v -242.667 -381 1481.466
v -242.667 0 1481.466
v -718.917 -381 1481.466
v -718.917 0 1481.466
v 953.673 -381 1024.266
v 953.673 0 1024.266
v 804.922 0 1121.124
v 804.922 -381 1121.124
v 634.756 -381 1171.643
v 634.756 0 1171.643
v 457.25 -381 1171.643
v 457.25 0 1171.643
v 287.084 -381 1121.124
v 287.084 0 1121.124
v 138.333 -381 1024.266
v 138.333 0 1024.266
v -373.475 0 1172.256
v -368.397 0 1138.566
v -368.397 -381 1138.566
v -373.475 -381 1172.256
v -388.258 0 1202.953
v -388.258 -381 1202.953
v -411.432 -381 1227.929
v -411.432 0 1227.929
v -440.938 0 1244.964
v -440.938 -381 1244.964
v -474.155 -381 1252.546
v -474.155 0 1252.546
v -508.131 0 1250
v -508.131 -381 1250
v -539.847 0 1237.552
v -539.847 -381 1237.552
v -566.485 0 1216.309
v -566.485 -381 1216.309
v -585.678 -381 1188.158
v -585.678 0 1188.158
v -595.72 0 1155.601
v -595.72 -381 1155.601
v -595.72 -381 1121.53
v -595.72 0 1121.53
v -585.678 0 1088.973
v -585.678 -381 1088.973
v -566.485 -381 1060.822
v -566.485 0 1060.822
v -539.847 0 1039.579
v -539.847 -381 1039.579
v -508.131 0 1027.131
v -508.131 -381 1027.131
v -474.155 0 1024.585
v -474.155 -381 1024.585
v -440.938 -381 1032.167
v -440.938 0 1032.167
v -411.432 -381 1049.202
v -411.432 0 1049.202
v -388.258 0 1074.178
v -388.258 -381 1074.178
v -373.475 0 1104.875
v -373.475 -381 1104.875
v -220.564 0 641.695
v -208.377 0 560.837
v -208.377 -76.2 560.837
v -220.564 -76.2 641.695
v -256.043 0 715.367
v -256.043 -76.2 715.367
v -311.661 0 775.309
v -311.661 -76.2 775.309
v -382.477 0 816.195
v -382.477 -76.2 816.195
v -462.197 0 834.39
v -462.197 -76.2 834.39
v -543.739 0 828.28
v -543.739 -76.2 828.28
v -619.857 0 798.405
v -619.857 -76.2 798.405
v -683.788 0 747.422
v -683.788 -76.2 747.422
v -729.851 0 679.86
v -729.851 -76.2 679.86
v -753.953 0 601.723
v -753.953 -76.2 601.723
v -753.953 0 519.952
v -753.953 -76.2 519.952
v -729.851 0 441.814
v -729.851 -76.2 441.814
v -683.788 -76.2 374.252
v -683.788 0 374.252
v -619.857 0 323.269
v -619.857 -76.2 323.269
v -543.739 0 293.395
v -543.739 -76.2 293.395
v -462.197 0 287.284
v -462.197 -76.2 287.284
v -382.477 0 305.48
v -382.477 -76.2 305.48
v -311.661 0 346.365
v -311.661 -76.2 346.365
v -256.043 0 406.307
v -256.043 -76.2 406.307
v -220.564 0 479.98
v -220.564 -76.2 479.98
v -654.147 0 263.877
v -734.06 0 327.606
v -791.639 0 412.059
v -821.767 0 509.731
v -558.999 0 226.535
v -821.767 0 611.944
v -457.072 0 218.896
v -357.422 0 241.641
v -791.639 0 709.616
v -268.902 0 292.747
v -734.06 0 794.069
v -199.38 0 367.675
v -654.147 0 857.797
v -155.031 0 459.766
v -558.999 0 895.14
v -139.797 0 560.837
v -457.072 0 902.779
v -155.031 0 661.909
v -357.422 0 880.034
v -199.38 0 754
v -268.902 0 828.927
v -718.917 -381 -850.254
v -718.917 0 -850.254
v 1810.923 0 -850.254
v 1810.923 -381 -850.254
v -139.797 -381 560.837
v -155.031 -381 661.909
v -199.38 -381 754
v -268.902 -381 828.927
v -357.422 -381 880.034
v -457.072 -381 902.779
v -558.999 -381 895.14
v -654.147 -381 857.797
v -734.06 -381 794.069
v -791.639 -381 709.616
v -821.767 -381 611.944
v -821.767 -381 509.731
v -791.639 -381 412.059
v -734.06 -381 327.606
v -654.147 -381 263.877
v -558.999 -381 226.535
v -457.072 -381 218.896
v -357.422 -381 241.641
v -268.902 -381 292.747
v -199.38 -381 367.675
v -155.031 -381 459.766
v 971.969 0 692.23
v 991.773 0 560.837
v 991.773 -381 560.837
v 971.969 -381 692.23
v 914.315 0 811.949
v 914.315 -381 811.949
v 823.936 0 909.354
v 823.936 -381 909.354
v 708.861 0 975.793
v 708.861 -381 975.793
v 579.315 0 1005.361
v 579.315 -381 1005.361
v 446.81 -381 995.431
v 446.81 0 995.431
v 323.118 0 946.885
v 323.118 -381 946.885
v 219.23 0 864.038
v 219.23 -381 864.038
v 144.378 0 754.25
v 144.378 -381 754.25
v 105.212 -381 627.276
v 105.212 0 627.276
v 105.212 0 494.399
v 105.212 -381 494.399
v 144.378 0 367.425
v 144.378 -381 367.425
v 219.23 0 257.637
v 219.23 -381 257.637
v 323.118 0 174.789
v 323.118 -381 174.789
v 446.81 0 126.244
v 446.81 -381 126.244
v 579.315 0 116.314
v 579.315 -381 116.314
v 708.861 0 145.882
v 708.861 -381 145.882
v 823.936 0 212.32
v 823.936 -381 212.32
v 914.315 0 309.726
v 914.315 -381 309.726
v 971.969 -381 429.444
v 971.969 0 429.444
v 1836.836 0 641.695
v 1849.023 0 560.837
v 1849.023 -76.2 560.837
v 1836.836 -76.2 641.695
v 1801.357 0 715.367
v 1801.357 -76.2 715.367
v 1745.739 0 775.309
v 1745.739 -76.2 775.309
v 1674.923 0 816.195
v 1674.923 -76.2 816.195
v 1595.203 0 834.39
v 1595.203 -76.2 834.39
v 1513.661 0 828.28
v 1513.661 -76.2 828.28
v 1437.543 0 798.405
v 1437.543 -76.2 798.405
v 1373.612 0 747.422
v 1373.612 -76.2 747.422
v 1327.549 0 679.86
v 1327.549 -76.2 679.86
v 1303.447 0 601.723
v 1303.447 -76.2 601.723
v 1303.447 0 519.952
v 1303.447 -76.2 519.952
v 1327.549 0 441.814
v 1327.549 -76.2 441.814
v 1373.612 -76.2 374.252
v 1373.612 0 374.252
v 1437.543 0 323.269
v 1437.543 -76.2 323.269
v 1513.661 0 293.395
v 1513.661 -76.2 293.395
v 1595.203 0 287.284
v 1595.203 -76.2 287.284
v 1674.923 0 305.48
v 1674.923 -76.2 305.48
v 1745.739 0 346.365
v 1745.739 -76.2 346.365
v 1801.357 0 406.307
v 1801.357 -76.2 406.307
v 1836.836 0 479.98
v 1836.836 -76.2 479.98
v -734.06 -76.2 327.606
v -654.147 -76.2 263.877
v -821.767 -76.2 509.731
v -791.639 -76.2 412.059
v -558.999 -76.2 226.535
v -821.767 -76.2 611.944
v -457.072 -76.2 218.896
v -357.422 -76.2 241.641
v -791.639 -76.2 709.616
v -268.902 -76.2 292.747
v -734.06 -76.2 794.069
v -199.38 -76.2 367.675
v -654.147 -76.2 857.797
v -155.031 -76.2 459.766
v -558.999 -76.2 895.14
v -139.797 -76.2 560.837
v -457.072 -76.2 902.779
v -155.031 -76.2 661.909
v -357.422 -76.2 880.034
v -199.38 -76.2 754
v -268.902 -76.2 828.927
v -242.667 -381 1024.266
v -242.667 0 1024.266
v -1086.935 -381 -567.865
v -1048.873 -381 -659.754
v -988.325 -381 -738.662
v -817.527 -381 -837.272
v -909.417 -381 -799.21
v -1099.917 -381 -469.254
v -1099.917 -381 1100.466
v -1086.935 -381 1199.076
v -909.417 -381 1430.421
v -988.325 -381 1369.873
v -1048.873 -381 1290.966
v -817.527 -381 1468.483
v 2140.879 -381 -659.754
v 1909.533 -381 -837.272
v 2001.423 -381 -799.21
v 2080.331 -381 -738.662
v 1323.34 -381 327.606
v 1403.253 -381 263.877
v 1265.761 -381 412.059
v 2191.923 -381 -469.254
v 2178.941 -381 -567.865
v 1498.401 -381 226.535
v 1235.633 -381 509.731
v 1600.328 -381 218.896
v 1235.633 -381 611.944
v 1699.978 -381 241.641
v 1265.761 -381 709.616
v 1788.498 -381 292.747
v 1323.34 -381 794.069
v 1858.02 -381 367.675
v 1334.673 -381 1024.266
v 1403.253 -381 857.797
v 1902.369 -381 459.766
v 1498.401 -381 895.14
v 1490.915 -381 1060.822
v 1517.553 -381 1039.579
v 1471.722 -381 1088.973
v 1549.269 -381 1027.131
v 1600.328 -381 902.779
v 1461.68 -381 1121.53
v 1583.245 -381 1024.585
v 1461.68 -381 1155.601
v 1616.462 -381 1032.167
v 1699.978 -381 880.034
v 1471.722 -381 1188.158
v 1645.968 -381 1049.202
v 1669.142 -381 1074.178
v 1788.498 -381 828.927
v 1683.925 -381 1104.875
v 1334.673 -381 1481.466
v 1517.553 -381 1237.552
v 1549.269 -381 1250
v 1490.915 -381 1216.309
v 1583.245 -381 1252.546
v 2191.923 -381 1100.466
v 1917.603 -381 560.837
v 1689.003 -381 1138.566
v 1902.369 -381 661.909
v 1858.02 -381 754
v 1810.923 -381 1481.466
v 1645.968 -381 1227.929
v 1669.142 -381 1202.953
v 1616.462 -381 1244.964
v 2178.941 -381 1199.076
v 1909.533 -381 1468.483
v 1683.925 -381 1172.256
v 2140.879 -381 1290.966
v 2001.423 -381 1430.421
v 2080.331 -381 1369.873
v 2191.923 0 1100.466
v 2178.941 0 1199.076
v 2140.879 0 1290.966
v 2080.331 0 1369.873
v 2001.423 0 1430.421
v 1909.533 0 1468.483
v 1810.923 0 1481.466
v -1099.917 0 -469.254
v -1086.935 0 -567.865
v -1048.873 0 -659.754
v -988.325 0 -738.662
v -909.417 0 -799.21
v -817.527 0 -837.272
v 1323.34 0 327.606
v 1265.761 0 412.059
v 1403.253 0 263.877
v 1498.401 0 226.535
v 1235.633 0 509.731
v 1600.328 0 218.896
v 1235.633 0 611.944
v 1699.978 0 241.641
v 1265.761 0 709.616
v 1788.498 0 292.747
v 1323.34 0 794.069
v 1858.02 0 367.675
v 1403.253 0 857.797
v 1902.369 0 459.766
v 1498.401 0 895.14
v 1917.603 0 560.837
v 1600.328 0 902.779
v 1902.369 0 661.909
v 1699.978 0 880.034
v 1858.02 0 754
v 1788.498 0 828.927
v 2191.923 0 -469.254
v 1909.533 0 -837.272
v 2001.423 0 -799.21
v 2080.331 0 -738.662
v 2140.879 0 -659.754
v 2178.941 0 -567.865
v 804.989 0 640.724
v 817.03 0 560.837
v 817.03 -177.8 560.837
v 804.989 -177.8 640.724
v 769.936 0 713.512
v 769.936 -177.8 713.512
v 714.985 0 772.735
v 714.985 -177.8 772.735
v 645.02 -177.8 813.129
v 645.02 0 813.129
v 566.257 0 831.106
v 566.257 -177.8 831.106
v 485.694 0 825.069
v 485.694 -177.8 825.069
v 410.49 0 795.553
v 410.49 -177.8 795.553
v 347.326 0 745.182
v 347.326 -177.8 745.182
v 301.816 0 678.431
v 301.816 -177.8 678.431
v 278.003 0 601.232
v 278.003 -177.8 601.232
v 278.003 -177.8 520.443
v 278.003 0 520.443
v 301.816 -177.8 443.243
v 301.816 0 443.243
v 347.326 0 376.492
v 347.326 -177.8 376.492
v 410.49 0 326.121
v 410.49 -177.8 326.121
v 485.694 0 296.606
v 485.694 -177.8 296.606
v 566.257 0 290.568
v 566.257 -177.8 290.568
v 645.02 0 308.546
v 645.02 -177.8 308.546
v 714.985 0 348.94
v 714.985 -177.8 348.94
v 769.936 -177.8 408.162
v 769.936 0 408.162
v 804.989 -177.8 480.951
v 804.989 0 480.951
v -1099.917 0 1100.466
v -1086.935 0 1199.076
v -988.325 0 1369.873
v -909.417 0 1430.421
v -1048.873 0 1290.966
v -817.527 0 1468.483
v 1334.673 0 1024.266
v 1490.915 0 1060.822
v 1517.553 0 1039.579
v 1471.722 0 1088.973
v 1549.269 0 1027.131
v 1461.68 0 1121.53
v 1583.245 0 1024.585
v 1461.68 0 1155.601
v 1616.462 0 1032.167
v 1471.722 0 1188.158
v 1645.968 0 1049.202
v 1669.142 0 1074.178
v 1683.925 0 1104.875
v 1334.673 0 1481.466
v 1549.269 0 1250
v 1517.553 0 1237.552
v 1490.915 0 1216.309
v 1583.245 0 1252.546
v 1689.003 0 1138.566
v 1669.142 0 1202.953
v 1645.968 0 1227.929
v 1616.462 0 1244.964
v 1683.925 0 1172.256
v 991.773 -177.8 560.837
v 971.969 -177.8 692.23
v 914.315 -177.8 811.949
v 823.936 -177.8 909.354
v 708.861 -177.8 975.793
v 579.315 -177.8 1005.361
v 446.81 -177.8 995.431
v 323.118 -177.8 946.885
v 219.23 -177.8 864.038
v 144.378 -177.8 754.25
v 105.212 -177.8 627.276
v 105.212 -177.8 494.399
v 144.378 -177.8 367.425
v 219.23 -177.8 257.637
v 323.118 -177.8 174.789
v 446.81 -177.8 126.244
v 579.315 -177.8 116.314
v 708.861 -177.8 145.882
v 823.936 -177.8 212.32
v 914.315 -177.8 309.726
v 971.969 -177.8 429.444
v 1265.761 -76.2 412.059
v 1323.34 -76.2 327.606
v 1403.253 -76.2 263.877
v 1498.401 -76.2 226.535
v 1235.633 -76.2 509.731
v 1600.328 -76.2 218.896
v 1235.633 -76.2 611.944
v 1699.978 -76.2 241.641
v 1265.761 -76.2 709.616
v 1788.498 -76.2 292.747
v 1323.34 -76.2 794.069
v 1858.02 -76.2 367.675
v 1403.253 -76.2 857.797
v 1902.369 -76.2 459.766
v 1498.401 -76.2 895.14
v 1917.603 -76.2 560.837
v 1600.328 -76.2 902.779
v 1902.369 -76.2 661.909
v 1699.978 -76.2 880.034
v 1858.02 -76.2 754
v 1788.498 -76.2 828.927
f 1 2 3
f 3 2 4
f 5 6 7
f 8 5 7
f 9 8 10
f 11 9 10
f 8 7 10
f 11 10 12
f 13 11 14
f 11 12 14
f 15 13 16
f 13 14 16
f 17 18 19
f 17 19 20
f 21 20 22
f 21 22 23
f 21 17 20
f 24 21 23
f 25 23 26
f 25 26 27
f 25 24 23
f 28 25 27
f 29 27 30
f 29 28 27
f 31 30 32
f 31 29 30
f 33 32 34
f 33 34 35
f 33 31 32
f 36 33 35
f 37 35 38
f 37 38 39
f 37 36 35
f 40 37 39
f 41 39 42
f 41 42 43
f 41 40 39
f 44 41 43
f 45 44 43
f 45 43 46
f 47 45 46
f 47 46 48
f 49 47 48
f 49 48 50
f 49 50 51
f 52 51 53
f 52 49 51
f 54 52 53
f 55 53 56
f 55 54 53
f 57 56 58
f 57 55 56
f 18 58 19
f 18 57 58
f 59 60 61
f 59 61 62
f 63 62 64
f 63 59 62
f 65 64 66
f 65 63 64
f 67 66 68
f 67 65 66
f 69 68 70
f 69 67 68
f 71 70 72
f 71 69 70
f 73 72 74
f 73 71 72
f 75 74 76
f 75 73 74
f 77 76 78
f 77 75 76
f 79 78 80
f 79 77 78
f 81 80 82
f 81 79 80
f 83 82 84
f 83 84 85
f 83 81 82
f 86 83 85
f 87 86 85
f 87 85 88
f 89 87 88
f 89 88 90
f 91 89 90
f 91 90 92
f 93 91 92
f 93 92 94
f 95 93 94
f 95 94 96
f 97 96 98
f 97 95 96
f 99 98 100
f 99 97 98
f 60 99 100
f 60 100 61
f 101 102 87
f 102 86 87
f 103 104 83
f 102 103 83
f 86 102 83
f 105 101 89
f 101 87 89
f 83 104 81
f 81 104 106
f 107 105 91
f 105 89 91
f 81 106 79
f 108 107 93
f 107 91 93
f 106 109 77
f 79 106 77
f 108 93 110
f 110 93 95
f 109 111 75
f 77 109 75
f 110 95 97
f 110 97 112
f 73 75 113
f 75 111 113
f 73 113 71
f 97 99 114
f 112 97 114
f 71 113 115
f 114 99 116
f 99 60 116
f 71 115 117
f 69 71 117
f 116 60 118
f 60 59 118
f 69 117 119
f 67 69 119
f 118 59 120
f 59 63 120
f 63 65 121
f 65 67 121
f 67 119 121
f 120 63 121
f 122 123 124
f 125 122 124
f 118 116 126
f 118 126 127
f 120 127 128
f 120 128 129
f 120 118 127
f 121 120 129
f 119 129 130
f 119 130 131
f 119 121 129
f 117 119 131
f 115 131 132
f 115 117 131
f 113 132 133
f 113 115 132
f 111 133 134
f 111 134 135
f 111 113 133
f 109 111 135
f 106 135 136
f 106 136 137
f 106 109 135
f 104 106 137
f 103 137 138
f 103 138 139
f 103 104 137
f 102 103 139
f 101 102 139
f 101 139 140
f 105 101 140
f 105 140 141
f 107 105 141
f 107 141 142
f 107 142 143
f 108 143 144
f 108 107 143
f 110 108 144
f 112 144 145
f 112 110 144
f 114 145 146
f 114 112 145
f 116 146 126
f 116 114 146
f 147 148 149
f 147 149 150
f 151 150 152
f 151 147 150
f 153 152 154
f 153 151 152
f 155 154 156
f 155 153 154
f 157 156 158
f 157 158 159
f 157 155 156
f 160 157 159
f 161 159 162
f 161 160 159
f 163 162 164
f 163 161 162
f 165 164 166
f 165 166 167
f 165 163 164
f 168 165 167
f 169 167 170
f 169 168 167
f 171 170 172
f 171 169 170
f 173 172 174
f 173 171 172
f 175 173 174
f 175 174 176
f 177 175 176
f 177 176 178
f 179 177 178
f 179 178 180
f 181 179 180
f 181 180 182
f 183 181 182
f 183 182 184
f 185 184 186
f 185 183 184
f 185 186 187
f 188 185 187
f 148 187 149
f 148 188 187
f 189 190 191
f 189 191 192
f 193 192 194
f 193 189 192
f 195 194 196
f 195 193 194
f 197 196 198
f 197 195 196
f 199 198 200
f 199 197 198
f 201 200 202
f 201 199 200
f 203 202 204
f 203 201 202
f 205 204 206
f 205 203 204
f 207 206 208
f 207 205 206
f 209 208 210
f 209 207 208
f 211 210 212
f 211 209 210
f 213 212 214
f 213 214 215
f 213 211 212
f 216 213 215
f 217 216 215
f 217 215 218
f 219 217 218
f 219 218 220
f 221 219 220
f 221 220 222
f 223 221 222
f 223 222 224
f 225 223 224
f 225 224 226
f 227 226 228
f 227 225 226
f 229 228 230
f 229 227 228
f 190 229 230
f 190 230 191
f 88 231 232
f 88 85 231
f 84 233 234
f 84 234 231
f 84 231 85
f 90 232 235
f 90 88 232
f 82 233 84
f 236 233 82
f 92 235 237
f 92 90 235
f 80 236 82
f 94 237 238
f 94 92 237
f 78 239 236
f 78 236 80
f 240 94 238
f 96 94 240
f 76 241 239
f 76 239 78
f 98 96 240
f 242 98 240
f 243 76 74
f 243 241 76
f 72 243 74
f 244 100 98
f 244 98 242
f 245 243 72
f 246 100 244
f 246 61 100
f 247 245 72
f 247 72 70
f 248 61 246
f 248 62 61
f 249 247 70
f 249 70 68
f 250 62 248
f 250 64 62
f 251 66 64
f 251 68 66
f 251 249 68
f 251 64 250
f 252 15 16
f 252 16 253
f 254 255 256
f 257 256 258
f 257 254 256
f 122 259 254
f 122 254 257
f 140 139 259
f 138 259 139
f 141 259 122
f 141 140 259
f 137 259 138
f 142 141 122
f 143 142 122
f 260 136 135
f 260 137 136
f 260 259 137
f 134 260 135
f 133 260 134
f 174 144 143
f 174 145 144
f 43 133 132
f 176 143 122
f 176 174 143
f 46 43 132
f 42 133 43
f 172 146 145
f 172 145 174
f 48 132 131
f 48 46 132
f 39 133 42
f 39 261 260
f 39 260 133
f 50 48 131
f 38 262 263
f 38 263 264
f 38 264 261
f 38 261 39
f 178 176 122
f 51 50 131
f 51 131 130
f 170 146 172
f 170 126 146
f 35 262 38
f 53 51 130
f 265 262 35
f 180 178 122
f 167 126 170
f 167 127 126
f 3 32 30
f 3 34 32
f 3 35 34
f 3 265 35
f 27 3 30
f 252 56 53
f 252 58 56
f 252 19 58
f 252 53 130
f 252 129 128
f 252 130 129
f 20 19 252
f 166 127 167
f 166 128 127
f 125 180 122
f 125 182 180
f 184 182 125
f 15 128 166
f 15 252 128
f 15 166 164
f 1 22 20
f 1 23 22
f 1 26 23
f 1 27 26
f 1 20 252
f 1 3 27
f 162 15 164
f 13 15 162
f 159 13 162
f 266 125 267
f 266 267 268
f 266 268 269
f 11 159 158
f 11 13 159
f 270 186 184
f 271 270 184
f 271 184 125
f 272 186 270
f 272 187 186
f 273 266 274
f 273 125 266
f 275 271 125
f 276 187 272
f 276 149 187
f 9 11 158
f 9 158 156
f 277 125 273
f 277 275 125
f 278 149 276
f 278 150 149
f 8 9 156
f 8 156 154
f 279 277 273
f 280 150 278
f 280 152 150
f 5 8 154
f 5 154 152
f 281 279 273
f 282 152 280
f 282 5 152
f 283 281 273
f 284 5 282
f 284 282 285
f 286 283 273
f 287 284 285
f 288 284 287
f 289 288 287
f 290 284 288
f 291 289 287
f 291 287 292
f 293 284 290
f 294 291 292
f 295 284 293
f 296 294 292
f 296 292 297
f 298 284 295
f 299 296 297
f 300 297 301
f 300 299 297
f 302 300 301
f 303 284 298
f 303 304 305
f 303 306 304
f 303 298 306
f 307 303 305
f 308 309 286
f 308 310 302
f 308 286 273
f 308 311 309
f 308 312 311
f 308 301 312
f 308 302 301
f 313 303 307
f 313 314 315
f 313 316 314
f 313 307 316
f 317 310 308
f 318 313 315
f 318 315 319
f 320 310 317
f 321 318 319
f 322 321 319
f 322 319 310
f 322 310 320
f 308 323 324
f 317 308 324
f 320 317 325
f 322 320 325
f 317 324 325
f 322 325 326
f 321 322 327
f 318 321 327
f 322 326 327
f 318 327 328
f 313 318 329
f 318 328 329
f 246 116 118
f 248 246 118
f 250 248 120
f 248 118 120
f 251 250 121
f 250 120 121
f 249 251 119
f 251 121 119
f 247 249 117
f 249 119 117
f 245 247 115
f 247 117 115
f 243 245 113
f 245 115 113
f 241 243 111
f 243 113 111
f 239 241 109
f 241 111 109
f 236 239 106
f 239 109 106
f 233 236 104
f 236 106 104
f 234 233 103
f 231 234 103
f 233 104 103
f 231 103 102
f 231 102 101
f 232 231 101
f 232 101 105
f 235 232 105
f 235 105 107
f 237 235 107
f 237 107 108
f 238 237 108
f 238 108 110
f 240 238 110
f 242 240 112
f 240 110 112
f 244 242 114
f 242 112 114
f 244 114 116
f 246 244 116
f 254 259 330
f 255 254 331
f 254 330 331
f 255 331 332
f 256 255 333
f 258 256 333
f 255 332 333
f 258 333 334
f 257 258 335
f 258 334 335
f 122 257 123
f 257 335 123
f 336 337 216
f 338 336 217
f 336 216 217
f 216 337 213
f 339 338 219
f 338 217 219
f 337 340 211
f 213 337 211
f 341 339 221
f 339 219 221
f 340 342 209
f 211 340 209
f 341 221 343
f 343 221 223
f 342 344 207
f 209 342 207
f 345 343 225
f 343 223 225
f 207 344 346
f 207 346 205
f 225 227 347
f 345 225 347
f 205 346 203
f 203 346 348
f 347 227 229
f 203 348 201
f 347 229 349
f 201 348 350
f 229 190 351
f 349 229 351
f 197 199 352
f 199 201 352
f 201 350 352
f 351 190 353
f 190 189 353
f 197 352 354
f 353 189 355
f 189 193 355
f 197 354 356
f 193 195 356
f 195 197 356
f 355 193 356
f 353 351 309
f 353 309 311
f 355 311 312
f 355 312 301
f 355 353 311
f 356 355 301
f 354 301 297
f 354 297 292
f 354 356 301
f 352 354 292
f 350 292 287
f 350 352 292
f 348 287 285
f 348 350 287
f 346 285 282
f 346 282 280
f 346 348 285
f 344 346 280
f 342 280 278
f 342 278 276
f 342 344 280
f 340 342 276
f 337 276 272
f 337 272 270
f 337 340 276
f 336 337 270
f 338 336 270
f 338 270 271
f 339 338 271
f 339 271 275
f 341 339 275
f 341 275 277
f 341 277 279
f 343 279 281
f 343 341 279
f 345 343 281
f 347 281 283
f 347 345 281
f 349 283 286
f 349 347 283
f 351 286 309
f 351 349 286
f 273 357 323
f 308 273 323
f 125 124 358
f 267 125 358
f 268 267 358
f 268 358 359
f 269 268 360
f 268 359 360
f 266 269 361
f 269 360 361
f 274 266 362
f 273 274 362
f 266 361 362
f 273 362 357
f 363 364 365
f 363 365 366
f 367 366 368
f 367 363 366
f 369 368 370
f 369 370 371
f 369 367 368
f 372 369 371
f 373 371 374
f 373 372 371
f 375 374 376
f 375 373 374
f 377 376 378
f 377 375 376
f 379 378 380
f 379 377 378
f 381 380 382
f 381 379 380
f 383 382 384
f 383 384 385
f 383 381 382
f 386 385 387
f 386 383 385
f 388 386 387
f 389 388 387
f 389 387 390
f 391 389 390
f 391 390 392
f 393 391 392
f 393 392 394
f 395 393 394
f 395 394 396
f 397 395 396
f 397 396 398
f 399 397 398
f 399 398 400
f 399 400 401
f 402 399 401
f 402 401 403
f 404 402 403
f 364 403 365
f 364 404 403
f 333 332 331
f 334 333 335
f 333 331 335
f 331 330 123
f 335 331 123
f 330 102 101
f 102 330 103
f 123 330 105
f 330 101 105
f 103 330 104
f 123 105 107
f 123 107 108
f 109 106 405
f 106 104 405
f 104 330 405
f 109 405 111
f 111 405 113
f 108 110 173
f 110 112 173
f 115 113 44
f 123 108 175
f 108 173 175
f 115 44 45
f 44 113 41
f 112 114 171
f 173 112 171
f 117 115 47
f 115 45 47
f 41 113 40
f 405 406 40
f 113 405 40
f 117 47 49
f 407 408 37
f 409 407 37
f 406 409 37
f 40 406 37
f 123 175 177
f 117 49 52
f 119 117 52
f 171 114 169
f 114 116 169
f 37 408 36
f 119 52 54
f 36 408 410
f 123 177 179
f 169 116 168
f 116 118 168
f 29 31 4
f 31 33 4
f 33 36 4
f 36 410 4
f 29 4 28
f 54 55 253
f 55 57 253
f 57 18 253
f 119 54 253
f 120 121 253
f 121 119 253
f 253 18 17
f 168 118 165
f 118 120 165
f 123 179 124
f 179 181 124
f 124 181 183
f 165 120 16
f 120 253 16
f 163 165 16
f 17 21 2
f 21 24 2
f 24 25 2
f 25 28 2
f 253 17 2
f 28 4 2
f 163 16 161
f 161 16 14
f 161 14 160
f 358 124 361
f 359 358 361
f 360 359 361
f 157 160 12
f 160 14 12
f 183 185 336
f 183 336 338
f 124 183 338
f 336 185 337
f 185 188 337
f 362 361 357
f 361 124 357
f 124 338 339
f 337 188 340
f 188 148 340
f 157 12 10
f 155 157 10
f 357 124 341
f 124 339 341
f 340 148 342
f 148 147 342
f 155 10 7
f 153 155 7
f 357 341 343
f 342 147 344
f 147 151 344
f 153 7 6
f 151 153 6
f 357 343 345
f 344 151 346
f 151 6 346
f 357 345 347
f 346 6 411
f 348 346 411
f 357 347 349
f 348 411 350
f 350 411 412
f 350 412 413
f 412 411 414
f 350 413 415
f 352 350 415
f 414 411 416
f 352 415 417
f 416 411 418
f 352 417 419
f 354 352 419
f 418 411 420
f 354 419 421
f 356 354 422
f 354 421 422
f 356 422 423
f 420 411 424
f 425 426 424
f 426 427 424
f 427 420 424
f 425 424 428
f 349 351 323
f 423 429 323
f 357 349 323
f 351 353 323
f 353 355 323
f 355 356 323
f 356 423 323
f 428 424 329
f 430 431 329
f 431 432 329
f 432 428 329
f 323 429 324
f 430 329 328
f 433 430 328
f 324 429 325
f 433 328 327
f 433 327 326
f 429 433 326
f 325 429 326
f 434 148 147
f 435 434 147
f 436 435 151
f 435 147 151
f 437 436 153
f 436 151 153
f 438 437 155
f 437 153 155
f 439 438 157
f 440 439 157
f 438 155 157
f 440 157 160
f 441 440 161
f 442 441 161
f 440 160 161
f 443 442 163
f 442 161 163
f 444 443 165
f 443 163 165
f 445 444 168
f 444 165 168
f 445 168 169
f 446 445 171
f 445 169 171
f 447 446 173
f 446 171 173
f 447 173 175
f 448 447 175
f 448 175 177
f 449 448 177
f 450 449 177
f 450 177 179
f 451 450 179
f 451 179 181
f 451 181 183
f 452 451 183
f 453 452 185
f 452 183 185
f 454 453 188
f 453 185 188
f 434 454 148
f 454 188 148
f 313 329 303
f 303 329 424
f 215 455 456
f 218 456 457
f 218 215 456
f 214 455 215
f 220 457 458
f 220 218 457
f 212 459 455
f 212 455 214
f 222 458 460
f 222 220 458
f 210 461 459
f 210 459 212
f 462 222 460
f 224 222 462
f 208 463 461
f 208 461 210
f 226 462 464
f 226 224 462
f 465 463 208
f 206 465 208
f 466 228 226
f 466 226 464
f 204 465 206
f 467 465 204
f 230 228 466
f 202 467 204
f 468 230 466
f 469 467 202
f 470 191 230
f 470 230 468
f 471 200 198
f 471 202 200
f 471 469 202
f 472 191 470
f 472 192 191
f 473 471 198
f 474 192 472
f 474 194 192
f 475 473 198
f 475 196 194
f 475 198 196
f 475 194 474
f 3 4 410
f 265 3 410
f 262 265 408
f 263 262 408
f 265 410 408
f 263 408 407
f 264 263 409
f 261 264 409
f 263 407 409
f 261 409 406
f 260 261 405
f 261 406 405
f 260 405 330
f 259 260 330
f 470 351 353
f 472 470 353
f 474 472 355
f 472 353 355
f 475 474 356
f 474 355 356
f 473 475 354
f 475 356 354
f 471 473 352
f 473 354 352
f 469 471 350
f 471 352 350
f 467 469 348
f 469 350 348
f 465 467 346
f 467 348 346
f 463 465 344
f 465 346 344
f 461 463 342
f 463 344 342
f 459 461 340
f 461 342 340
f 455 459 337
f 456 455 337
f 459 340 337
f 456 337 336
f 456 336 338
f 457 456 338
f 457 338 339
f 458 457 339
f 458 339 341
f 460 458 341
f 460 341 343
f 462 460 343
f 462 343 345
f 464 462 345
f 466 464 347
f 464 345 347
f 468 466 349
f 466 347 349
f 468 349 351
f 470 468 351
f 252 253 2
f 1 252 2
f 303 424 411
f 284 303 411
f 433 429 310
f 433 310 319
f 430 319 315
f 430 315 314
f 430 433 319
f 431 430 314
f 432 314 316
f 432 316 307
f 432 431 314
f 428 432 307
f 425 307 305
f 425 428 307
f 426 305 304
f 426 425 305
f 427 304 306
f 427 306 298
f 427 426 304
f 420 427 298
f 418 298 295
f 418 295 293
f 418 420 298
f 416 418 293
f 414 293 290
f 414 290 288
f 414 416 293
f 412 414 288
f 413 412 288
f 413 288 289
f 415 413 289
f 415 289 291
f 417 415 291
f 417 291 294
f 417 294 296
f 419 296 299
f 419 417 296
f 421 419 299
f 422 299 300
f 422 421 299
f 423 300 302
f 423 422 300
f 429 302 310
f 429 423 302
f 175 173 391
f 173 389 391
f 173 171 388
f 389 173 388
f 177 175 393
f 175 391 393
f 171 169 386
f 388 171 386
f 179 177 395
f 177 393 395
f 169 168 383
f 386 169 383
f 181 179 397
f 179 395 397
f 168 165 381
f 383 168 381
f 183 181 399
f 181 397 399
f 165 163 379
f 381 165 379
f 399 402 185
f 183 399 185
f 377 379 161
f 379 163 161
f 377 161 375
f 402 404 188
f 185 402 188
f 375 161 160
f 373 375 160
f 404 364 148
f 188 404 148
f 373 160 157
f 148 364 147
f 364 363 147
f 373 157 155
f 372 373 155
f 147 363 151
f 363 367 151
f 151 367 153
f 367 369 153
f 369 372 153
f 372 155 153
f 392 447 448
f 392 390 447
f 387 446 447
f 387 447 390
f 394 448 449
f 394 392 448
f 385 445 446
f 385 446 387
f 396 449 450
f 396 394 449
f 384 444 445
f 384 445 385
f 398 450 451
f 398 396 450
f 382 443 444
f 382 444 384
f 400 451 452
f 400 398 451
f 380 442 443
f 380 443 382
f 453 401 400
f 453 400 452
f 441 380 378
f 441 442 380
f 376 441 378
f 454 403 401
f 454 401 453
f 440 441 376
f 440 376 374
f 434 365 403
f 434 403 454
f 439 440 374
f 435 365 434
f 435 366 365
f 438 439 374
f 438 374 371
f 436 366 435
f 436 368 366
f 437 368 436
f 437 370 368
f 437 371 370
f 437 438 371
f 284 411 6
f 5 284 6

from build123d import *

# Parameters (mm, degrees)
F0_R     = 342.9
F0_R_2   = 274.32
F1_DEPTH = 76.2
F0_R_3   = 445.77
F0_R_4   = 271.026796
F2_DEPTH = 177.8
F0_R_5   = 114.3
F3_DEPTH = 381


with BuildPart() as f1:
    # F0 (on Front) → F1 (new body)
    with BuildSketch(Plane.XZ):
        with Locations((-482.696971, 560.837328)):
            Circle(F0_R)
        with Locations((-482.696971, 560.837328)):
            Circle(F0_R_2, mode=Mode.SUBTRACT)
        with Locations((1574.703029, 560.837328)):
            Circle(F0_R)
        with Locations((1574.703029, 560.837328)):
            Circle(F0_R_2, mode=Mode.SUBTRACT)
    extrude(amount=F1_DEPTH)


with BuildPart() as f2:
    # F0 (on Front) → F2 (new body)
    with BuildSketch(Plane.XZ):
        with Locations((546.003029, 560.837328)):
            Circle(F0_R_3)
        with Locations((546.003029, 560.837328)):
            Circle(F0_R_4, mode=Mode.SUBTRACT)
    extrude(amount=F2_DEPTH)


with BuildPart() as f3:
    # F0 (on Front) → F3 (new body)
    with BuildSketch(Plane.XZ):
        with BuildLine():
            Line((2191.923029, -469.254468), (2191.923029, 1100.465532))
            ThreePointArc((2191.923029, 1100.465532), (2080.330713, 1369.873215), (1810.923029, 1481.465532))
            Line((1810.923029, 1481.465532), (1498.286486, 1481.465532))
            Line((1498.286486, 1481.465532), (1334.673029, 1481.465532))
            Line((1334.673029, 1481.465532), (1334.673029, 1024.265532))
            Line((1334.673029, 1024.265532), (953.673029, 1024.265532))
            ThreePointArc((953.673029, 1024.265532), (546.003029, 1178.057328), (138.333029, 1024.265532))
            Line((138.333029, 1024.265532), (-242.666971, 1024.265532))
            Line((-242.666971, 1024.265532), (-242.666971, 1481.465532))
            Line((-242.666971, 1481.465532), (-718.916971, 1481.465532))
            ThreePointArc((-718.916971, 1481.465532), (-988.324655, 1369.873215), (-1099.916971, 1100.465532))
            Line((-1099.916971, 1100.465532), (-1099.916971, -469.254468))
            ThreePointArc((-1099.916971, -469.254468), (-988.324655, -738.662152), (-718.916971, -850.254468))
            Line((-718.916971, -850.254468), (1810.923029, -850.254468))
            ThreePointArc((1810.923029, -850.254468), (2080.330713, -738.662152), (2191.923029, -469.254468))
        make_face()
        with Locations((-482.696971, 560.837328)):
            Circle(F0_R, mode=Mode.SUBTRACT)
        with Locations((546.003029, 560.837328)):
            Circle(F0_R_3, mode=Mode.SUBTRACT)
        with Locations((-482.696971, 1138.565532)):
            Circle(F0_R_5, mode=Mode.SUBTRACT)
        with Locations((1574.703029, 560.837328)):
            Circle(F0_R, mode=Mode.SUBTRACT)
        with Locations((1574.703029, 1138.565532)):
            Circle(F0_R_5, mode=Mode.SUBTRACT)
    extrude(amount=F3_DEPTH)


solid = Compound([f1.part, f2.part, f3.part])
